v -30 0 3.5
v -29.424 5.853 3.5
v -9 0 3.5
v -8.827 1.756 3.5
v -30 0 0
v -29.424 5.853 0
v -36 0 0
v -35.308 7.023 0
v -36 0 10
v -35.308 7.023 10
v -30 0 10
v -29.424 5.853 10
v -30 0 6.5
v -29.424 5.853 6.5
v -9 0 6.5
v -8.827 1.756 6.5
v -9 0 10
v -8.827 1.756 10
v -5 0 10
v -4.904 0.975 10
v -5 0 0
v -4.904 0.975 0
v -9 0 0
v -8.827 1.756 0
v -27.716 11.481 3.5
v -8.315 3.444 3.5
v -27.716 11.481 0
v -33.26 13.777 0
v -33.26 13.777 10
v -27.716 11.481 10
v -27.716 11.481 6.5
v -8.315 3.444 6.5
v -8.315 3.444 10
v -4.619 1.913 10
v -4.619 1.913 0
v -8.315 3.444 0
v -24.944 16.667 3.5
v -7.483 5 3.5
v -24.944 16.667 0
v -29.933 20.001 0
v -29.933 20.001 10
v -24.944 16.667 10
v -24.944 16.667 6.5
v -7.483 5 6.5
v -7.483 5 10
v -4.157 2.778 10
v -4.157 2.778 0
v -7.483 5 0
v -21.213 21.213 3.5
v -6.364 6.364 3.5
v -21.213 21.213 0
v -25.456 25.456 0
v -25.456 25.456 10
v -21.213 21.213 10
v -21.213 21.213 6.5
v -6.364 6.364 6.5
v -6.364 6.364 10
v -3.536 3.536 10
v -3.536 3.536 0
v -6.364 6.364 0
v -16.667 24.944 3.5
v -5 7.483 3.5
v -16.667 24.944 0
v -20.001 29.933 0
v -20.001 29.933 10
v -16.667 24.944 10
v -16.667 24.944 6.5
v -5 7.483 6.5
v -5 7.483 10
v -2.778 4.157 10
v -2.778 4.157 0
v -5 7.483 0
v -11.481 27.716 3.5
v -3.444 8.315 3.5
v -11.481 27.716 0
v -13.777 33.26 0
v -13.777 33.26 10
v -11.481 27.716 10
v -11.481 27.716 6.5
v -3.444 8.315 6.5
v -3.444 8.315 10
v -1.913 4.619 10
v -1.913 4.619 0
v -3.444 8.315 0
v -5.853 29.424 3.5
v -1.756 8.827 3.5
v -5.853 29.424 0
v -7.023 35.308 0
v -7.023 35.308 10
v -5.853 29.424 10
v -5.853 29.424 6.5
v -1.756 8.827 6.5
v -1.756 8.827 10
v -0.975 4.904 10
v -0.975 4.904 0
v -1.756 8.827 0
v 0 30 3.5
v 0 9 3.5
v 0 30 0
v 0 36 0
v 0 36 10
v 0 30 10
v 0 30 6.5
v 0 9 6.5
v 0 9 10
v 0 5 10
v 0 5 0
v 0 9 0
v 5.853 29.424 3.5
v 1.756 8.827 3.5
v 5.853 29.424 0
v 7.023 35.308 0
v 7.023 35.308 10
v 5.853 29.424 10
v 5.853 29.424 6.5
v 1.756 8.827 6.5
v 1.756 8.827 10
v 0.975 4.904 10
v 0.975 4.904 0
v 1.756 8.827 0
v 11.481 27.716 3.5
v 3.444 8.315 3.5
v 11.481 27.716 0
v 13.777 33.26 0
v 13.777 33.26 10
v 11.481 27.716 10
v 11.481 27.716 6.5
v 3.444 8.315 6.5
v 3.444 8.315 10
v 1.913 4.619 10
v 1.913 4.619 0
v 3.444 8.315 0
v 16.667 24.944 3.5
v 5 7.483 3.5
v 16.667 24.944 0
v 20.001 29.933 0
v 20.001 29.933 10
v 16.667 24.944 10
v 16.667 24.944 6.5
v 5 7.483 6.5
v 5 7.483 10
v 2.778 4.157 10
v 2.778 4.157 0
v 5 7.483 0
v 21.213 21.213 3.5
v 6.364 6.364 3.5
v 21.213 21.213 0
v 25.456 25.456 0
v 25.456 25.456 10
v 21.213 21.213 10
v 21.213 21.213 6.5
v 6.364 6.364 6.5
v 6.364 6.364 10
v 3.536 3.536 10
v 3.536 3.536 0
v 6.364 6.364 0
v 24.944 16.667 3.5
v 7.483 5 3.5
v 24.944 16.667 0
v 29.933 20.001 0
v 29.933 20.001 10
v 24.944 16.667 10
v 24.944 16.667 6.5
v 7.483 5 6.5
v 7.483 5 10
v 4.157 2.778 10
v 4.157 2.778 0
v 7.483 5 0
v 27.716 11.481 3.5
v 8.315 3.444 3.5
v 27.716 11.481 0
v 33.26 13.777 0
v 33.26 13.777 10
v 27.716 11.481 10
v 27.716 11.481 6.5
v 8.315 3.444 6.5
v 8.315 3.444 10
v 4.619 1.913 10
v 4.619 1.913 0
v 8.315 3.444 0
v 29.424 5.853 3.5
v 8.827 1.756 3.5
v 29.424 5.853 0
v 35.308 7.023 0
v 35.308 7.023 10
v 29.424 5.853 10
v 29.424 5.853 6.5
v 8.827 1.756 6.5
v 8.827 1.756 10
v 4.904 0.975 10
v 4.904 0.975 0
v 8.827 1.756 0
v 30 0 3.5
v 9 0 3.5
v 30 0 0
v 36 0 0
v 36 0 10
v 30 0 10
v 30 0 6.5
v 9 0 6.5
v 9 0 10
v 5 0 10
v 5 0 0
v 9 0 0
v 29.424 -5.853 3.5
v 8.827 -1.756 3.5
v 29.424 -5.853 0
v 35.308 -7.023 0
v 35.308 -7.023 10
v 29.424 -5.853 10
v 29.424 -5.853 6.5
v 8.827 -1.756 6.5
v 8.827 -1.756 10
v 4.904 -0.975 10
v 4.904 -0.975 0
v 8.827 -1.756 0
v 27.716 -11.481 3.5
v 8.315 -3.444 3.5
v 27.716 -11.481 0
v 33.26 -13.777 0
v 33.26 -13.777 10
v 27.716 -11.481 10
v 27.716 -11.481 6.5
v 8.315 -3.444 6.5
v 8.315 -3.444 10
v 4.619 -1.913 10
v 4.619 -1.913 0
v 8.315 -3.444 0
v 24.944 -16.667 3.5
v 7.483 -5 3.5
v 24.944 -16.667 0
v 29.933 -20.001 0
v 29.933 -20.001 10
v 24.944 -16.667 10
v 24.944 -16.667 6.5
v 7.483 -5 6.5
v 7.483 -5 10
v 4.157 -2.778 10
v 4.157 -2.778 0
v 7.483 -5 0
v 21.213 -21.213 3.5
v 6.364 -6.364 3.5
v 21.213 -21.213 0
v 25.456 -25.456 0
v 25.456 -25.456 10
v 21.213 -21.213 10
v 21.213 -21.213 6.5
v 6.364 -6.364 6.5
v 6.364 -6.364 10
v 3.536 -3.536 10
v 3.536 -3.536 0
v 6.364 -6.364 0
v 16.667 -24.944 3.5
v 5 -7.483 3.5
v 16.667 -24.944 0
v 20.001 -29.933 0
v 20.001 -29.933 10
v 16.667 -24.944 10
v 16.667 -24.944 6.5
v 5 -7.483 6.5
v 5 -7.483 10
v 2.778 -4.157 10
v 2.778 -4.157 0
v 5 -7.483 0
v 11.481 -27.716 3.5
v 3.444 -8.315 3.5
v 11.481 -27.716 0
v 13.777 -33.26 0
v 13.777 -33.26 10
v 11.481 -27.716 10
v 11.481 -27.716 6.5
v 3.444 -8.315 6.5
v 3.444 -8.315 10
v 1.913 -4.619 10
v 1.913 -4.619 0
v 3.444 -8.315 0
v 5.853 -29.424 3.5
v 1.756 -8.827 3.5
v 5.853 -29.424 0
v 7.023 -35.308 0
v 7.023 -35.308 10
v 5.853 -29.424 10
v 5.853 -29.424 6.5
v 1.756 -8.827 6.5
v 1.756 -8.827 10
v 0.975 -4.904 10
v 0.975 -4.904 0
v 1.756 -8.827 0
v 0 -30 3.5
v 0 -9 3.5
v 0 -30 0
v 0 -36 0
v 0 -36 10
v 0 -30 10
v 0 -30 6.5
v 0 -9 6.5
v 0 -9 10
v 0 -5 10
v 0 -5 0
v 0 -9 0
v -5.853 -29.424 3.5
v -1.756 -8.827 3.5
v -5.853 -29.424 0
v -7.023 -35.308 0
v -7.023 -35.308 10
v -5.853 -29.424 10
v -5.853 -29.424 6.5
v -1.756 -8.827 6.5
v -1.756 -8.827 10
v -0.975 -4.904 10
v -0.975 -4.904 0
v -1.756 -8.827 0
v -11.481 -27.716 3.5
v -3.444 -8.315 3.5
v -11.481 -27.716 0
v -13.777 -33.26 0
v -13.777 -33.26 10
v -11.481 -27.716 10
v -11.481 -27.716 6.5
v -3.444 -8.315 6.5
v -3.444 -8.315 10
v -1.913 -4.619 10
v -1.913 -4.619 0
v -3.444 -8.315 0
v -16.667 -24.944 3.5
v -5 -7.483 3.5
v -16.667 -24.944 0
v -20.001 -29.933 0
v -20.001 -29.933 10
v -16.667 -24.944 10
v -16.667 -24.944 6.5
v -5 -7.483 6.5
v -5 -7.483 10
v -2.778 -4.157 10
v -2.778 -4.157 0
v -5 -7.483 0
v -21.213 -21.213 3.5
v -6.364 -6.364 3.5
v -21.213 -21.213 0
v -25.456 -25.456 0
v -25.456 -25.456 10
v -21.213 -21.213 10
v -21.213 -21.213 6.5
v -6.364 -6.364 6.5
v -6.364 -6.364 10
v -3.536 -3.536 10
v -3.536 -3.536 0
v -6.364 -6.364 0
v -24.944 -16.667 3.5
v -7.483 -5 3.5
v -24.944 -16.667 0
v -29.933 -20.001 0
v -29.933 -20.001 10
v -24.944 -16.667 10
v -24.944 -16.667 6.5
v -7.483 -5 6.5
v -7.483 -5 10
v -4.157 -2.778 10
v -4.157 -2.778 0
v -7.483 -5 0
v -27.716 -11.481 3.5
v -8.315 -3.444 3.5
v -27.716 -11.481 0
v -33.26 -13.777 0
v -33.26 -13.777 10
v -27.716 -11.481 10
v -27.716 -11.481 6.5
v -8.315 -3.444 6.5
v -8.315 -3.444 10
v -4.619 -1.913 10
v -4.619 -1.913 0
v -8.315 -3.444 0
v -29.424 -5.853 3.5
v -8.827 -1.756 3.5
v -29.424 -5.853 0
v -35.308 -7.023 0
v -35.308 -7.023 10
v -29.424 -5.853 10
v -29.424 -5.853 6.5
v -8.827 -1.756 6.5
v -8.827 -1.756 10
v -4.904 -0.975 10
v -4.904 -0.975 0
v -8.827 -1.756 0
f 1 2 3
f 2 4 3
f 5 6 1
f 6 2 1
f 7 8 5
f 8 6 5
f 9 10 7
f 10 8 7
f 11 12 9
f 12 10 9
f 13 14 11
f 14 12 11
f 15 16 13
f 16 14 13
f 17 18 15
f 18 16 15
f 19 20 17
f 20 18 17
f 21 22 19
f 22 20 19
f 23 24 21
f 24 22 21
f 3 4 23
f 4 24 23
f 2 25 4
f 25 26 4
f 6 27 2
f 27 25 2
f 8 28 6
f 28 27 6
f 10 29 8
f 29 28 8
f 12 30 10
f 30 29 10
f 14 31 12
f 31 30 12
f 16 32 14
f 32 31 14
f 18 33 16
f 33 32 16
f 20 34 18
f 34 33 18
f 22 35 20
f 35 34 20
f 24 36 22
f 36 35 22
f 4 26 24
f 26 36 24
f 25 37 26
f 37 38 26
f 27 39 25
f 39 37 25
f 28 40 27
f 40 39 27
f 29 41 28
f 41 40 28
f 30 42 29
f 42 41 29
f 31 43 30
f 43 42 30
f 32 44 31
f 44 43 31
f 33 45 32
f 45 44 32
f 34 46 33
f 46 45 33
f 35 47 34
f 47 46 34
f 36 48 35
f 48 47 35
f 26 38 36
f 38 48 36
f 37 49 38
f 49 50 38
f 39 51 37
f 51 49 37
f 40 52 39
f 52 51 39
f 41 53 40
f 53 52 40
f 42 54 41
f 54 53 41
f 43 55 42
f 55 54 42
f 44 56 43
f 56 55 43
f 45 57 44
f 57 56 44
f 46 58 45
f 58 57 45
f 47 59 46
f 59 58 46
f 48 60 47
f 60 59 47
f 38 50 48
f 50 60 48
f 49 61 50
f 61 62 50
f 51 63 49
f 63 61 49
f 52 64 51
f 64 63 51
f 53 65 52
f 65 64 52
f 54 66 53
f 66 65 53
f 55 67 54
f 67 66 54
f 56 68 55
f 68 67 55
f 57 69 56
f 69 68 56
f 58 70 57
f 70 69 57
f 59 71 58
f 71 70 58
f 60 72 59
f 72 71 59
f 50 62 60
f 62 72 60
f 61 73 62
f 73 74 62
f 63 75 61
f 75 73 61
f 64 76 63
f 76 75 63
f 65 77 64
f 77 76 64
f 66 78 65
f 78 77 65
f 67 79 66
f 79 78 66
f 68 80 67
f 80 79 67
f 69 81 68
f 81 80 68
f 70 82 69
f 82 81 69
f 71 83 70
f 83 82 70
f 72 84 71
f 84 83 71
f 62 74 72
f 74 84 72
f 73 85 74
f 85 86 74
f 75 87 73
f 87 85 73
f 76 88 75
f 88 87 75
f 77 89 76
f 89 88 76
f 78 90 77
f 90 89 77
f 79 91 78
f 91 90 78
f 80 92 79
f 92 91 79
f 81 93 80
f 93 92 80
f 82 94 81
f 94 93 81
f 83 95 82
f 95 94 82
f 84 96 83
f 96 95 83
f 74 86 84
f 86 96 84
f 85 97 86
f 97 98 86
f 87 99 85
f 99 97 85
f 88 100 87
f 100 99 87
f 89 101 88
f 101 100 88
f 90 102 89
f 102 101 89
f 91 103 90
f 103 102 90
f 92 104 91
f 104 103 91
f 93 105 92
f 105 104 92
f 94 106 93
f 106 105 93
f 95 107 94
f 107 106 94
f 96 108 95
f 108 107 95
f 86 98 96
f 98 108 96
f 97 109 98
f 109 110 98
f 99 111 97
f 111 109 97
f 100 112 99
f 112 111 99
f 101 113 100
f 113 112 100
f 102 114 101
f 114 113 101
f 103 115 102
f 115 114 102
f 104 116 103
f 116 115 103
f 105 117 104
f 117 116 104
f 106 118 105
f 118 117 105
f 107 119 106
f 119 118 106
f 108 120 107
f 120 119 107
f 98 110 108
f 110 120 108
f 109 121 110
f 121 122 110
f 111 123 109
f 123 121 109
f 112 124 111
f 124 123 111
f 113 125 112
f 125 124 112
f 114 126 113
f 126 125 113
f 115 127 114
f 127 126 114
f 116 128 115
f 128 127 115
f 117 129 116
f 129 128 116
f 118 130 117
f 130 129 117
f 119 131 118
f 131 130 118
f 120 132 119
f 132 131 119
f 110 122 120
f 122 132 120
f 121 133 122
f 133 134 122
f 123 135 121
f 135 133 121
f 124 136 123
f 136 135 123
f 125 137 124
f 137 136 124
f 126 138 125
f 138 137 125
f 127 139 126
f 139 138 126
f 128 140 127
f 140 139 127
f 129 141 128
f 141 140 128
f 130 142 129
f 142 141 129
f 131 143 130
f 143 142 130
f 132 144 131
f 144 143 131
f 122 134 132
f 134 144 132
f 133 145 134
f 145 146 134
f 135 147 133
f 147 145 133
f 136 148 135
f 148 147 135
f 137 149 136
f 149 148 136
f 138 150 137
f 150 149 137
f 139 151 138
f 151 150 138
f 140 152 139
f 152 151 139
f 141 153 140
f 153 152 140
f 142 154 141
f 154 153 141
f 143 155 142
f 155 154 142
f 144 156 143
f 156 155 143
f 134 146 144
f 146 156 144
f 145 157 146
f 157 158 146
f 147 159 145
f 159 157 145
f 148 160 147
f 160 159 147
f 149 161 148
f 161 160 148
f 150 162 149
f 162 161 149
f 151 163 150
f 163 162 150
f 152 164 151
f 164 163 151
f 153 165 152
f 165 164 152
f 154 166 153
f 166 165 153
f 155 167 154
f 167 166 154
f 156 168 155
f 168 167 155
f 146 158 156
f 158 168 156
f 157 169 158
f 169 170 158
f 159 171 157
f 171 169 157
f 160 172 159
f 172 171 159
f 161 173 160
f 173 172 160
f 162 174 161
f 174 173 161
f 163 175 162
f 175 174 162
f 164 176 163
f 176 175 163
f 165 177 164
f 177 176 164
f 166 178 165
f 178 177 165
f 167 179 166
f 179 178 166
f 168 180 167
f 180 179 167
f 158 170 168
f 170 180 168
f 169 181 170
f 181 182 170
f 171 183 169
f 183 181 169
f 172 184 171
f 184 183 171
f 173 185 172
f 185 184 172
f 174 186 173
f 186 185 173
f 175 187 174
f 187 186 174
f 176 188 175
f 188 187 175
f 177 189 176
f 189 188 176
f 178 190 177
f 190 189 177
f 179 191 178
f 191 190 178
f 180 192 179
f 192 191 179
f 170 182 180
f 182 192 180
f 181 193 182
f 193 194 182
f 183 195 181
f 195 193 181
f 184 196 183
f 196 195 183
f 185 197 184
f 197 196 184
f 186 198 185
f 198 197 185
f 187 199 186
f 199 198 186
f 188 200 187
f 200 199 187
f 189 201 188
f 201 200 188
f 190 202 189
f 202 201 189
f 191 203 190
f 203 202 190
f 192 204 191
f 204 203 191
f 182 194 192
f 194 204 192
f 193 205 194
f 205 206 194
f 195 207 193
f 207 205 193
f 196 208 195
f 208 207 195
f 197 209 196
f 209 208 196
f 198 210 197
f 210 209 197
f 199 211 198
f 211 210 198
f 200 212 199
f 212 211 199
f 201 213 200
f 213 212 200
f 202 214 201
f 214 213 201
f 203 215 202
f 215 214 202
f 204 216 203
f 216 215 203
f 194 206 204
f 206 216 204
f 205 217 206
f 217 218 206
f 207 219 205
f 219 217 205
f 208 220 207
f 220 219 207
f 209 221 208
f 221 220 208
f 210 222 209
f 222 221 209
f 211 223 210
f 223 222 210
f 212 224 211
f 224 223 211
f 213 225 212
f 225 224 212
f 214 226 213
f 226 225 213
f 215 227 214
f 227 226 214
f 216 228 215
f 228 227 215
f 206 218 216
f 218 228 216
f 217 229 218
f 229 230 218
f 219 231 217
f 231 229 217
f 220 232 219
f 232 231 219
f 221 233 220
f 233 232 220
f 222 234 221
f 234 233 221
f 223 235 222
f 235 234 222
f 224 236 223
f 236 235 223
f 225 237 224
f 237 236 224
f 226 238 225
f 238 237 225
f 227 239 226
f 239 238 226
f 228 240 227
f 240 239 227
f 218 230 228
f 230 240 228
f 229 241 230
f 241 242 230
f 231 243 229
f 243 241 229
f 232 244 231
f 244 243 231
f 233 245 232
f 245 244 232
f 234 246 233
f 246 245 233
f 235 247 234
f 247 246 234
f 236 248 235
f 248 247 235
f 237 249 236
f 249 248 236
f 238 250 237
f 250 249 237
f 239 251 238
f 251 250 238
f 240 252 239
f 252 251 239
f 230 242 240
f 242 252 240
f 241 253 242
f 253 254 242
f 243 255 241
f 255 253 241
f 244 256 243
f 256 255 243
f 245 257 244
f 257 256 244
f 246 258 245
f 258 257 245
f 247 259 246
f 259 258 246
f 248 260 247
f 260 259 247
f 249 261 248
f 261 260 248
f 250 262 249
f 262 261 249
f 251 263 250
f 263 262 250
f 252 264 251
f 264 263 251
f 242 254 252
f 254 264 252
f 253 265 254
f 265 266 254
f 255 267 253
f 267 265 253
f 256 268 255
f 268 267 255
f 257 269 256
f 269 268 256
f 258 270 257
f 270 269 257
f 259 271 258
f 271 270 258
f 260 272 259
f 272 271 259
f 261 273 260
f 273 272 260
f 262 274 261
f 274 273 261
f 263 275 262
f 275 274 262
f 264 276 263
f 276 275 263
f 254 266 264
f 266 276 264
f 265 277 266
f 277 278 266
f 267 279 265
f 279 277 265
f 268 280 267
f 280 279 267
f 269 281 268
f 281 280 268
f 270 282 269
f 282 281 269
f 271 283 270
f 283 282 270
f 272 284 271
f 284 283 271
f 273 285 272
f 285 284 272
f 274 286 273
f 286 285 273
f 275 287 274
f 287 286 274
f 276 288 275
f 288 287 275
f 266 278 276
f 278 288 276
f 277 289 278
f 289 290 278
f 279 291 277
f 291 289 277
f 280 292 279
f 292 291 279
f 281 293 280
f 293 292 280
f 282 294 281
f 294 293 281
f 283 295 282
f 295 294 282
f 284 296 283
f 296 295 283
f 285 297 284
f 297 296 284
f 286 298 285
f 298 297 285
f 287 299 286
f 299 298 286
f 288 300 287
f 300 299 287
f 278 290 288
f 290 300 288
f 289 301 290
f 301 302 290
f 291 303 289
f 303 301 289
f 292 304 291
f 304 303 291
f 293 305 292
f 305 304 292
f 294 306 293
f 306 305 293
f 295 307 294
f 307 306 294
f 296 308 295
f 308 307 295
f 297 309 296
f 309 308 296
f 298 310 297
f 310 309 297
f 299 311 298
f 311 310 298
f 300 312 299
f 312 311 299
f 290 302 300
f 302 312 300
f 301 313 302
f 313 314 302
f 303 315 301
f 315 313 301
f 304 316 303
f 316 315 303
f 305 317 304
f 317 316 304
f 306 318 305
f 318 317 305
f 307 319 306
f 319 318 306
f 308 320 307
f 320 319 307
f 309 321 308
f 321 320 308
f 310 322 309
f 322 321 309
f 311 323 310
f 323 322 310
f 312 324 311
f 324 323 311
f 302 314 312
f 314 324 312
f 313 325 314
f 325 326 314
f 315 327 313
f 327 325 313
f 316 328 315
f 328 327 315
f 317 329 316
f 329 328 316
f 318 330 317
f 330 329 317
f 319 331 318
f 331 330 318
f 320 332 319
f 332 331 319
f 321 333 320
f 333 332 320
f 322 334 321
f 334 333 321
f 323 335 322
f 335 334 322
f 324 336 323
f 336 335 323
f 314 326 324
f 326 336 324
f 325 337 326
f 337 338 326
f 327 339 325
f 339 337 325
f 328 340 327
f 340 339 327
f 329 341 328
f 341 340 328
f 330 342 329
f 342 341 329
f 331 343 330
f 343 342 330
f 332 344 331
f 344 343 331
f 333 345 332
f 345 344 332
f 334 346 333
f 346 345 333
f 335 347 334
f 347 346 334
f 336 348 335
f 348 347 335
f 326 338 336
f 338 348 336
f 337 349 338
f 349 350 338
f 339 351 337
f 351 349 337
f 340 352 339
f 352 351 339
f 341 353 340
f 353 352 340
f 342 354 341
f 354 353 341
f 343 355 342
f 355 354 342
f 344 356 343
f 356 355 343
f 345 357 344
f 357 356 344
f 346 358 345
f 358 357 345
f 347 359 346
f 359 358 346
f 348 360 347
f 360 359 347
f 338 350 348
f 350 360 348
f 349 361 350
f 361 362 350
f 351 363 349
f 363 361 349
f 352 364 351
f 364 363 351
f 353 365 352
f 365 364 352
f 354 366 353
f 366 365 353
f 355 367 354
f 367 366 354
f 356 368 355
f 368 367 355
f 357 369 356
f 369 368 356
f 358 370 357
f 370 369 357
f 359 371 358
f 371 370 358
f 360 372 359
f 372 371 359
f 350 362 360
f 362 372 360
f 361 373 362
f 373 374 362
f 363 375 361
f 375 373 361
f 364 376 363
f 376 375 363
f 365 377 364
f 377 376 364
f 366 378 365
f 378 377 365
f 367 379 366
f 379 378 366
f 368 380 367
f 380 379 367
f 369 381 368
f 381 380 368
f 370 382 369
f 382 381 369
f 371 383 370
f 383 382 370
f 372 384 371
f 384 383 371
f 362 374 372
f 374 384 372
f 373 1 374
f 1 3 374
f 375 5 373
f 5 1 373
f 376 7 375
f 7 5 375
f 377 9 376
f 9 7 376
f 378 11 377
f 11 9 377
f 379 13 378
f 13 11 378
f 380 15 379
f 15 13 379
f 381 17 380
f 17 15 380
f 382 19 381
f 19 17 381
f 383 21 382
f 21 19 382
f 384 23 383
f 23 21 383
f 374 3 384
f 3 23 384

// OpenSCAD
$fn = 32;

// ----------------------------------------------------------------------
// Revolved part: handwheel R36
// ----------------------------------------------------------------------

// --- parameters (mm) ---
bore_r = 5;               // bore radius
rim_r = 36;               // rim radius
rim_w = 6;                // rim axial width
rim_t = 10;               // rim diameter height
hub_r = 9;                // hub radius
web_t = 3;                // web thickness
revolve_angle = 360;      // revolve sweep, degrees
fit_tol = 0.1;            // declared fit tolerance (prompt contract)
free_tol = 0.5;           // declared free tolerance (prompt contract)

bore_d = 2 * bore_r;
rim_d = 2 * rim_r;
hub_d = 2 * hub_r;

profile = [[5, 0], [9, 0], [9, 3.5], [30, 3.5], [30, 0], [36, 0], [36, 10], [30, 10], [30, 6.5], [9, 6.5], [9, 10], [5, 10]];  // primary outline, 12 points, counter clockwise

// --- the one profile operation ---
rotate_extrude(angle = revolve_angle) polygon(points = profile);
